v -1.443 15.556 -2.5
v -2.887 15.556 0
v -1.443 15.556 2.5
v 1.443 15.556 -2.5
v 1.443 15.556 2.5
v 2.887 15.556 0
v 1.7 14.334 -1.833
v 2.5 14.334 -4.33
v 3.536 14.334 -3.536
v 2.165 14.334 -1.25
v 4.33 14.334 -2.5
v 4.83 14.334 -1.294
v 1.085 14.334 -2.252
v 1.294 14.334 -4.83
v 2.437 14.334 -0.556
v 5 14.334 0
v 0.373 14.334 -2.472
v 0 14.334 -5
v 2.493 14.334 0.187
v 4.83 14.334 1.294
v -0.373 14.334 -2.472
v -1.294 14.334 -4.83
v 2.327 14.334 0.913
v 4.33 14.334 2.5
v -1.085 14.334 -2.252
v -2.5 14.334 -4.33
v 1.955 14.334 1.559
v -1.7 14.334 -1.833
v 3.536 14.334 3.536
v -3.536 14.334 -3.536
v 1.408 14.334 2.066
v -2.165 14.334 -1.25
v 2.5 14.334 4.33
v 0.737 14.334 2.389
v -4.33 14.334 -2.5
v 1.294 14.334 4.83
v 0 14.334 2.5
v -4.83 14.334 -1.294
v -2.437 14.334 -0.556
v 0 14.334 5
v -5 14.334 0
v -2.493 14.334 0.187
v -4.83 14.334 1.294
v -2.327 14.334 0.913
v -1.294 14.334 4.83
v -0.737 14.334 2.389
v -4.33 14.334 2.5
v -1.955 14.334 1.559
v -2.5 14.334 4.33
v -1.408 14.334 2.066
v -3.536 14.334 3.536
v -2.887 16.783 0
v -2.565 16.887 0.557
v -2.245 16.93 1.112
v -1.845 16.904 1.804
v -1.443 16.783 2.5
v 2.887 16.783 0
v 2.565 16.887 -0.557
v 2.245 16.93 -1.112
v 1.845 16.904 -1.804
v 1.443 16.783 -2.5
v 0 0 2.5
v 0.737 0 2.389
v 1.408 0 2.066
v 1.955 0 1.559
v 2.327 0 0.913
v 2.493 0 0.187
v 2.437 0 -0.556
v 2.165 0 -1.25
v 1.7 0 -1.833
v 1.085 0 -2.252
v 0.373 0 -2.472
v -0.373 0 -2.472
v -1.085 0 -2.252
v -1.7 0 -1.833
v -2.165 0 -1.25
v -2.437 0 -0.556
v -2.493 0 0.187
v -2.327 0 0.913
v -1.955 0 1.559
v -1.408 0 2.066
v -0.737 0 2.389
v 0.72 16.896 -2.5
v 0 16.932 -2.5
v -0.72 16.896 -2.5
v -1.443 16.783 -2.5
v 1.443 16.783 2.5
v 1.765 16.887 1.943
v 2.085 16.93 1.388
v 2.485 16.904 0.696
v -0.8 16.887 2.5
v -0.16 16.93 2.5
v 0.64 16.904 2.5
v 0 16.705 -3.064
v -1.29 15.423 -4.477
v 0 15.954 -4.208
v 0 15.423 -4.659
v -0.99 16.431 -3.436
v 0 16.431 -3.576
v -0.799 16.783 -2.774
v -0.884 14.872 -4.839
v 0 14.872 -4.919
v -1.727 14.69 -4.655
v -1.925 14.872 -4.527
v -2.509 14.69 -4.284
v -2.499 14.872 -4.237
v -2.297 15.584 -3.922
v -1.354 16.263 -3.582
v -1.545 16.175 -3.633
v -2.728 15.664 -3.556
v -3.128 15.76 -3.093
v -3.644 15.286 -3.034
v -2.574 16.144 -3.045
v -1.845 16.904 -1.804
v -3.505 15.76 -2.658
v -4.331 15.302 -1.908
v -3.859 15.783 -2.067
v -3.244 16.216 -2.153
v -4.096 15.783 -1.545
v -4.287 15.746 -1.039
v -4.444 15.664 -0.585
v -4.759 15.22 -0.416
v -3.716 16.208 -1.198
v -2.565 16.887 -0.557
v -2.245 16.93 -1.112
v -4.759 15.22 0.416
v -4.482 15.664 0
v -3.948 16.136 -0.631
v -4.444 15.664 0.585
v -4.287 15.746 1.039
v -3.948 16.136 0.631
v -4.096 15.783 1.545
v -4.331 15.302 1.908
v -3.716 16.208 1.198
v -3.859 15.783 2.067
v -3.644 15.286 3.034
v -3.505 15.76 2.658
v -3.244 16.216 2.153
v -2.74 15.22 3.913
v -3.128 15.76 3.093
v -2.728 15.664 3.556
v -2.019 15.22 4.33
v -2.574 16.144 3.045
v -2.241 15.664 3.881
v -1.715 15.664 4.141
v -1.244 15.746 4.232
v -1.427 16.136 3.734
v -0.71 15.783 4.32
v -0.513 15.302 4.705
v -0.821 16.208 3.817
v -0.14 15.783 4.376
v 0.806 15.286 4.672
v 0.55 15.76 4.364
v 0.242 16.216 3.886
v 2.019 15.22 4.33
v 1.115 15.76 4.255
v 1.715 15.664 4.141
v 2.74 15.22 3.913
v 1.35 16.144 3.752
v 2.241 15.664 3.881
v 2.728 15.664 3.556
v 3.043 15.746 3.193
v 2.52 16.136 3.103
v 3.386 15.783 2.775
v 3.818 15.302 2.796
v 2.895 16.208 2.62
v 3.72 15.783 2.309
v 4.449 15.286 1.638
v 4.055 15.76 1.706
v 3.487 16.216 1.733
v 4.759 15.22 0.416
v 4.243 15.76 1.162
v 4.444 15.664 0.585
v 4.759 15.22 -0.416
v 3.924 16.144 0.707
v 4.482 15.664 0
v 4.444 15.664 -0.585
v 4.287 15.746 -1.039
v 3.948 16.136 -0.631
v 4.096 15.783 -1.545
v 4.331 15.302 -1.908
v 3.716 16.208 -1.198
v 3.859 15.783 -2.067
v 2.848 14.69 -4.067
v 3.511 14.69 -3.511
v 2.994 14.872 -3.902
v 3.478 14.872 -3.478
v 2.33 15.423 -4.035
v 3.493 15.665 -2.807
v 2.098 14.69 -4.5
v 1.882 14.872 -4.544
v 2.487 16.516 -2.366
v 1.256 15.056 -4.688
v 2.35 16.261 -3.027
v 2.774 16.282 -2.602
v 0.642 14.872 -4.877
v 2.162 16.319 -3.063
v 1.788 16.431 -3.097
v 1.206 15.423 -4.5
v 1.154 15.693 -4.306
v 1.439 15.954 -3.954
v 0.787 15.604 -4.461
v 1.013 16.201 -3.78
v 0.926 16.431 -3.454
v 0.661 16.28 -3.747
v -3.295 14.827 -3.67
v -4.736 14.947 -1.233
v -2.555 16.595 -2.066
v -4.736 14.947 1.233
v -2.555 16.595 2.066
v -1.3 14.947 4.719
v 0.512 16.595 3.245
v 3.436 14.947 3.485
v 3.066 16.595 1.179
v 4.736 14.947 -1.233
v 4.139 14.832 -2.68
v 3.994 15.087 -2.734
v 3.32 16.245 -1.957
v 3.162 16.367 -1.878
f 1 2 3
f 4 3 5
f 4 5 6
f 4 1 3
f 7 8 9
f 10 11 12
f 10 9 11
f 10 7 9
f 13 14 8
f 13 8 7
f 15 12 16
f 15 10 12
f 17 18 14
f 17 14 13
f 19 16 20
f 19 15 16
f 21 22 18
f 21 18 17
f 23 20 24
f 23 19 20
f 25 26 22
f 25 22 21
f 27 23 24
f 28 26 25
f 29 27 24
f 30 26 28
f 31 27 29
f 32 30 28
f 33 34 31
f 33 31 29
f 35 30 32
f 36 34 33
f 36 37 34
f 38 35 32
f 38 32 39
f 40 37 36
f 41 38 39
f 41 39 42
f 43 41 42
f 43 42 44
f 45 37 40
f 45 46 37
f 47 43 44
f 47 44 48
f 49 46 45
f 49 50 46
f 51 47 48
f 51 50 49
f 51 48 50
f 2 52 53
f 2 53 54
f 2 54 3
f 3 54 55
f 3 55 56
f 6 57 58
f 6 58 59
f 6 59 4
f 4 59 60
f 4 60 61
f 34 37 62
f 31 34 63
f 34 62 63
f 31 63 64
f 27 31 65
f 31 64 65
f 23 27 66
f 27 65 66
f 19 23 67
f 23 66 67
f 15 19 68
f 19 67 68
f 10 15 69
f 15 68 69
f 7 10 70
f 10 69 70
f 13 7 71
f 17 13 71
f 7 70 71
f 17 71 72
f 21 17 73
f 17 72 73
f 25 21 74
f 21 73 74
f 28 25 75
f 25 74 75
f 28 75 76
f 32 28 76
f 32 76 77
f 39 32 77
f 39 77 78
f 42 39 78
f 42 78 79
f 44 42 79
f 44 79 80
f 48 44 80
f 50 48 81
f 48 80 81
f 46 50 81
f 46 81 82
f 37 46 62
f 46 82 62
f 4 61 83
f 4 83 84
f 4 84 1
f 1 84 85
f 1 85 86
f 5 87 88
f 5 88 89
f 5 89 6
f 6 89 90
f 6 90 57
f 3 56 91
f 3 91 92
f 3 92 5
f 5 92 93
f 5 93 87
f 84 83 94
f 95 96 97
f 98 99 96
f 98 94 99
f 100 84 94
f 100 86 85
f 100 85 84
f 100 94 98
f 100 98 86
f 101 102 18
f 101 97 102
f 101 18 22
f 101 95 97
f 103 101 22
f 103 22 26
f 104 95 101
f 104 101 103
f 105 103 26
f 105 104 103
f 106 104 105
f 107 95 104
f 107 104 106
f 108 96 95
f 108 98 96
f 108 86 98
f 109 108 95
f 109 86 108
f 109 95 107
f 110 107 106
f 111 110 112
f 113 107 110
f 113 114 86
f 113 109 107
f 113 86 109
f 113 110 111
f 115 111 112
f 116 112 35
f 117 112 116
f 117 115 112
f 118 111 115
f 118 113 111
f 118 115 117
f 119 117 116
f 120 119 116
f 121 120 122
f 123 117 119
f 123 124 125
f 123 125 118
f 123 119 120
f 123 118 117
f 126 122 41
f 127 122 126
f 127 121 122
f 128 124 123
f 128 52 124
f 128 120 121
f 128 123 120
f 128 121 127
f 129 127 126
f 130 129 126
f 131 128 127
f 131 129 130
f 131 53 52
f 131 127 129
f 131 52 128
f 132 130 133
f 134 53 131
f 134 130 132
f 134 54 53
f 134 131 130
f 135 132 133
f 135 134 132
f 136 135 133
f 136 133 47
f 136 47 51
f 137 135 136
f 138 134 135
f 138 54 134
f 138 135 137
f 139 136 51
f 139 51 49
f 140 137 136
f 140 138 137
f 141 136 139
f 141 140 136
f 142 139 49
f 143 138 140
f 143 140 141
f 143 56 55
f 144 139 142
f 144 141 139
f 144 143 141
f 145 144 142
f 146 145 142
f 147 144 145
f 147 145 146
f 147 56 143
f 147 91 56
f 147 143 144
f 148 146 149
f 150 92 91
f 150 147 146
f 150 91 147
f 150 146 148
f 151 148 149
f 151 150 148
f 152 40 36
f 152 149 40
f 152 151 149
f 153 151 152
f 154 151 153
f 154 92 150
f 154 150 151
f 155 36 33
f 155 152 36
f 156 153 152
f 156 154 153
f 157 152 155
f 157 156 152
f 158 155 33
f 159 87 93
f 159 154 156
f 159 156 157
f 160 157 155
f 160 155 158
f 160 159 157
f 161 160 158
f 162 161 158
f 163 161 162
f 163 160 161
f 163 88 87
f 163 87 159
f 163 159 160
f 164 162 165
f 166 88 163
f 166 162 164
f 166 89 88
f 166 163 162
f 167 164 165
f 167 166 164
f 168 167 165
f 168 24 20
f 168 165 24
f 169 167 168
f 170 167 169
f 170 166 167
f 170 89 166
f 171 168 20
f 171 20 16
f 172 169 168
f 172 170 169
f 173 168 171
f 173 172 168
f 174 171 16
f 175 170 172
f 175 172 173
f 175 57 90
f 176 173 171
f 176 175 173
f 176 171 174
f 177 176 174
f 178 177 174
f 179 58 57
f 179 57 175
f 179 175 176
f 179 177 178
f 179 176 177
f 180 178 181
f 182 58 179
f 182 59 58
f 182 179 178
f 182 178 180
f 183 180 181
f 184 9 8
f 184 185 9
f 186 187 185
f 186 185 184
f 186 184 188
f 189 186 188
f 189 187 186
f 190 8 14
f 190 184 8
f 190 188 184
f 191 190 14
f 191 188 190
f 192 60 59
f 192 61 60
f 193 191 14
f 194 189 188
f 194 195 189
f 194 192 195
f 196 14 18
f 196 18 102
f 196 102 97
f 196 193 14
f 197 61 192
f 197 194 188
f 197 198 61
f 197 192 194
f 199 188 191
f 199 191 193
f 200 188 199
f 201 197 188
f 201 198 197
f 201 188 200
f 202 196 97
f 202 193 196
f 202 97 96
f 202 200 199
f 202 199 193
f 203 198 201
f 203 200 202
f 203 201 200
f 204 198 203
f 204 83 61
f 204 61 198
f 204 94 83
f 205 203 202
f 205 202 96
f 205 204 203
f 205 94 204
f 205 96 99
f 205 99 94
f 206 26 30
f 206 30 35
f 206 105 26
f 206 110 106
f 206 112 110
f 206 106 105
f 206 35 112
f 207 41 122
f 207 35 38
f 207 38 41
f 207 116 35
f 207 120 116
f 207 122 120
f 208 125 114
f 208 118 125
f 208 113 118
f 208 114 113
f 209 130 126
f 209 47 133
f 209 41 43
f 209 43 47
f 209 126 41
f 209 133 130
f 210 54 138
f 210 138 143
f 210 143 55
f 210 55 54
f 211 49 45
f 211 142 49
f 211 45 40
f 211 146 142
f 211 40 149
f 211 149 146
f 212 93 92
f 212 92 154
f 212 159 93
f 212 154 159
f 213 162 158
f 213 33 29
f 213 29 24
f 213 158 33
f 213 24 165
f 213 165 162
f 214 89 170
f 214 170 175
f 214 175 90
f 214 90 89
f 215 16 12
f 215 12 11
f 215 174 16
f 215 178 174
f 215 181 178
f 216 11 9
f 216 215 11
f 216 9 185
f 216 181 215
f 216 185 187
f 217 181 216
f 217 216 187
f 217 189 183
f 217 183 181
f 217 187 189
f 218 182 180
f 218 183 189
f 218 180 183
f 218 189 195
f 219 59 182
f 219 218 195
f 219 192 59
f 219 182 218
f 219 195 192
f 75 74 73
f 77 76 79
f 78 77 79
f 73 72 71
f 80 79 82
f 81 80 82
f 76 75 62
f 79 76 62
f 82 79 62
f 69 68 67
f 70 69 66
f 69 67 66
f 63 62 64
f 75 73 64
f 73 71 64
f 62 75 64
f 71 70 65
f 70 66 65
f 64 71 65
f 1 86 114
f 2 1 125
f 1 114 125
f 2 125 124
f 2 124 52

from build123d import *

# Parameters (mm, degrees)
SKETCH1_R           = 2.5
BOSS_EXTRUDE1_DEPTH = 14.334
CUT_EXTRUDE1_DEPTH  = 1.778


with BuildPart() as part:
    # Sketch1 → Boss-Extrude1 (new body)
    with BuildSketch(Plane(origin=(0, 0, 0), x_dir=(1, 0, 0), z_dir=(0, 1, 0))):
        with Locations(Location((0, 0, 0), (0, 0, 270))):
            Circle(SKETCH1_R)
    extrude(amount=BOSS_EXTRUDE1_DEPTH)

    # Sketch2 → Revolve1 (revolve)
    with BuildSketch(Plane(origin=(0, 0, 0), x_dir=(0, 0, -1), z_dir=(1, 0, 0))):
        with BuildLine():
            Line((0, 14.334), (5, 14.334))
            add(Edge.make_bspline(
                [(5, 14.334), (5, 17.334), (0, 17.334)],
                knots=[0, 0, 0, 1.570796327, 1.570796327, 1.570796327], degree=2, weights=[1, 0.707106781, 1]))
            Line((0, 17.334), (0, 14.334))
        make_face()
    revolve(axis=Axis((0, 14.334, 0), (0, 1, 0)))

    # Sketch4 → Cut-Extrude1 (cut)
    with BuildSketch(Plane(origin=(0, 17.334, 0), x_dir=(1, 0, 0), z_dir=(0, 1, 0))):
        Polygon((2.886751346, 0), (1.443375673, 2.5), (-1.443375673, 2.5), (-2.886751346, 0), (-1.443375673, -2.5), (1.443375673, -2.5), align=None)
    extrude(amount=-CUT_EXTRUDE1_DEPTH, mode=Mode.SUBTRACT)


solid = part.part
